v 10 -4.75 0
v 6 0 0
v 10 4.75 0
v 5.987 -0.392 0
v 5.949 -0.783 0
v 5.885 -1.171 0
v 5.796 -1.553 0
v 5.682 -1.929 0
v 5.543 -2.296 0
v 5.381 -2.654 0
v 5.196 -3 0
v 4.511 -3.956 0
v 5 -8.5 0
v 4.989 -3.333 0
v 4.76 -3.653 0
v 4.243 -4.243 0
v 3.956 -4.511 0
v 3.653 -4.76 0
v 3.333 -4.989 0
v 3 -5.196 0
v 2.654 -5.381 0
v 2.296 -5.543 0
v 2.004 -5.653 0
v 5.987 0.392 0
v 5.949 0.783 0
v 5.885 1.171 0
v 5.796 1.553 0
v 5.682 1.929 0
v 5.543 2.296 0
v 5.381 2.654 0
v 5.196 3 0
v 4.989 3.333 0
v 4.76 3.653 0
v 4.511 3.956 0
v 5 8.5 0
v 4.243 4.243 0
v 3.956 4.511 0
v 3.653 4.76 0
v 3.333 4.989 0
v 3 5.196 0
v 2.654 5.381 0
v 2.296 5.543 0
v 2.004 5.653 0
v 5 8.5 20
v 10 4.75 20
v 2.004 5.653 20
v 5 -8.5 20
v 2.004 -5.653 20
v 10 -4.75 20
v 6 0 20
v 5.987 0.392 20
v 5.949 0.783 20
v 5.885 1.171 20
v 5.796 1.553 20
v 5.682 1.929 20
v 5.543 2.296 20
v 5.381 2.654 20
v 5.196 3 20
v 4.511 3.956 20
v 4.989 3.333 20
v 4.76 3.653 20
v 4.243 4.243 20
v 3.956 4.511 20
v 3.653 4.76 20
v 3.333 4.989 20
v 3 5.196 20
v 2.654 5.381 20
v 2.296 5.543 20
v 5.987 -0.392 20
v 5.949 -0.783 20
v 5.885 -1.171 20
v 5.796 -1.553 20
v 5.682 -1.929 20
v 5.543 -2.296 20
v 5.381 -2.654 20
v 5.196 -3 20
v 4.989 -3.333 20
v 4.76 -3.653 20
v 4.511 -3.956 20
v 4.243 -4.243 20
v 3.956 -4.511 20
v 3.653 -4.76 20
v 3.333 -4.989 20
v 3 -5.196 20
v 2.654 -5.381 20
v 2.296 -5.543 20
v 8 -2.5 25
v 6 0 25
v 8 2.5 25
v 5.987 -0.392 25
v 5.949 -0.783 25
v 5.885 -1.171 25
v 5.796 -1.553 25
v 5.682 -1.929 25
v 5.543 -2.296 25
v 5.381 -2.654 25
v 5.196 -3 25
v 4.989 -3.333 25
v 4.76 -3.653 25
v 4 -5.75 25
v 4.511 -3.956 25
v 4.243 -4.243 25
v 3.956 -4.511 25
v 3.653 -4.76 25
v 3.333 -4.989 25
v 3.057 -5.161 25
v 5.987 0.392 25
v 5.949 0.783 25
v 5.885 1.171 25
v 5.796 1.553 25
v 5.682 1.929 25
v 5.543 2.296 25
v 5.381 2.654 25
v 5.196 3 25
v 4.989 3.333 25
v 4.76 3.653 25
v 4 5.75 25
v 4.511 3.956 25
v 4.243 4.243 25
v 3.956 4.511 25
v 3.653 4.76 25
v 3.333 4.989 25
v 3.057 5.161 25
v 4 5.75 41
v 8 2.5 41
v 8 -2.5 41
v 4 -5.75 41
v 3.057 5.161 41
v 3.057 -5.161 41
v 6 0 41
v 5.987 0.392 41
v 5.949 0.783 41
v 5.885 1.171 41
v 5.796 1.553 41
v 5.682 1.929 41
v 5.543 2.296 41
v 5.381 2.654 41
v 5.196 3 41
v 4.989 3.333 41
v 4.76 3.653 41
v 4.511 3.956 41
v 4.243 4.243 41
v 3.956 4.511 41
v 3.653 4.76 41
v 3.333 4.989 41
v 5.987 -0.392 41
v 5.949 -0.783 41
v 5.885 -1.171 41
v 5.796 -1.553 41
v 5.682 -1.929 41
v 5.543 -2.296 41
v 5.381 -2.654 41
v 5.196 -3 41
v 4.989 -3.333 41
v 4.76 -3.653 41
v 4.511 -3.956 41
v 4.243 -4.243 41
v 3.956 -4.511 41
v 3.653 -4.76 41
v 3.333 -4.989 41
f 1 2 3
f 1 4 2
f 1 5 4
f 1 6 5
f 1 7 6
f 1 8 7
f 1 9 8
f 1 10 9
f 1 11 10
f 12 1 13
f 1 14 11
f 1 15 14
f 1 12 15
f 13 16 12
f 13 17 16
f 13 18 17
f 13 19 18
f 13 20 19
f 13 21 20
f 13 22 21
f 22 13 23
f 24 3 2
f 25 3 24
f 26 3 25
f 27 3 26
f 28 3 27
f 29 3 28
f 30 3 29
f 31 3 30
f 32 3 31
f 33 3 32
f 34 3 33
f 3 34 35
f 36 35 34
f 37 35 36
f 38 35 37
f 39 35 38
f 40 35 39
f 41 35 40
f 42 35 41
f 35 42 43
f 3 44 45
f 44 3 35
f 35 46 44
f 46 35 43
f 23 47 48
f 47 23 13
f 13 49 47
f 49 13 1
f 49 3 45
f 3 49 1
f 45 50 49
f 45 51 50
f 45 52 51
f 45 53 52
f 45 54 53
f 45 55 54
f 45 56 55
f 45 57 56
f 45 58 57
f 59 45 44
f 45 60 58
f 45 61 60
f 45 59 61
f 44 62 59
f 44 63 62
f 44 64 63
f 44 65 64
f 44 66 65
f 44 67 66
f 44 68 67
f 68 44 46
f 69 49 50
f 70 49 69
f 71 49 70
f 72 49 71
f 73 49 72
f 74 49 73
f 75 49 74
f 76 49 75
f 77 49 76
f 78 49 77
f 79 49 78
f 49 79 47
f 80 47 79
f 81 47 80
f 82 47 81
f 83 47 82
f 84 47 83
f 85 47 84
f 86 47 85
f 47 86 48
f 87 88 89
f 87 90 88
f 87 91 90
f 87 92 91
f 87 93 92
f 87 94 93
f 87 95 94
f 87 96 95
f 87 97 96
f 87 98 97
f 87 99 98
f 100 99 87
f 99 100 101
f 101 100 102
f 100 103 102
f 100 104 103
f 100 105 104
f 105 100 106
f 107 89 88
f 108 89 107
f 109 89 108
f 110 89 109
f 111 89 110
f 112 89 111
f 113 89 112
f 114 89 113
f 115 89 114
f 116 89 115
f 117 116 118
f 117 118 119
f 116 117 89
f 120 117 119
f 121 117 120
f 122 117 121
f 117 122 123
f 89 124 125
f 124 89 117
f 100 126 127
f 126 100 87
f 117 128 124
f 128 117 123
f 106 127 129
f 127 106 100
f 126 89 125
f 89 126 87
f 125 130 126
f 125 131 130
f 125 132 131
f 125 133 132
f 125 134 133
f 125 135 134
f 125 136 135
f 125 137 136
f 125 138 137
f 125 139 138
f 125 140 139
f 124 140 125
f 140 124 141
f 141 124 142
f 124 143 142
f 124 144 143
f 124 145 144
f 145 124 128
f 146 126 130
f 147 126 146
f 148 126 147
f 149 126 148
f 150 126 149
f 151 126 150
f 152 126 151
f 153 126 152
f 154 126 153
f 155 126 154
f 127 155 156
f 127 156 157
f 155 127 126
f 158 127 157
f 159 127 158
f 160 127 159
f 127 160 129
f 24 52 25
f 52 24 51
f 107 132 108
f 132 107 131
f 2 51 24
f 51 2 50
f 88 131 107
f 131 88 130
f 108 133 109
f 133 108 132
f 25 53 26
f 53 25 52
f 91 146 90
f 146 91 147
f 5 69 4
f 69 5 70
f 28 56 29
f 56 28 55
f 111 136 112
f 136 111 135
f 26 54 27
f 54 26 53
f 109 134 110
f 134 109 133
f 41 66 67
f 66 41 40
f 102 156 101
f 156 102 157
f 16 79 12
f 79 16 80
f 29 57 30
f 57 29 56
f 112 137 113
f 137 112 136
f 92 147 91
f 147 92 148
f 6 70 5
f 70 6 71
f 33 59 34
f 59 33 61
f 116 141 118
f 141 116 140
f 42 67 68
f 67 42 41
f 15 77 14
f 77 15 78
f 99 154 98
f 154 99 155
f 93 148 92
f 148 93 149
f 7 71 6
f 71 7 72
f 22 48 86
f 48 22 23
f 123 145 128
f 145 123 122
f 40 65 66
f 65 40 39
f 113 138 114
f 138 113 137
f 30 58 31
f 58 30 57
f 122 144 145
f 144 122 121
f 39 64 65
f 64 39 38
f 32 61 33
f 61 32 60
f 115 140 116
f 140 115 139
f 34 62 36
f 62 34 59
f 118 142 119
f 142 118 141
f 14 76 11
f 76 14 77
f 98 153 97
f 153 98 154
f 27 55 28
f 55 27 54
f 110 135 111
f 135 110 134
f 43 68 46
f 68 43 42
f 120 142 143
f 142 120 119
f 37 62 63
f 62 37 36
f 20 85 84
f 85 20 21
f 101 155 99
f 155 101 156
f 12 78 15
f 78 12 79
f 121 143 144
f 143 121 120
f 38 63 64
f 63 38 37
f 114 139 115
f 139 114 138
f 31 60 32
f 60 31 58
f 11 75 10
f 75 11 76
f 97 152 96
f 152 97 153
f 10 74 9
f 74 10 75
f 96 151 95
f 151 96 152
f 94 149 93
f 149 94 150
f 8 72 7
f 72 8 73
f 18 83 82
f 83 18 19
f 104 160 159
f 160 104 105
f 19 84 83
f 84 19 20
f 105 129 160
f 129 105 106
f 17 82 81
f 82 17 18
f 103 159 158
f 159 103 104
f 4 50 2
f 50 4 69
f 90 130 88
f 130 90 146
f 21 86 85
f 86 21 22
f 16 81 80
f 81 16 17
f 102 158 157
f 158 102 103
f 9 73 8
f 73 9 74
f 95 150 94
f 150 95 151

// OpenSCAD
// Hose-barb reducer: joins 8 mm inner-diameter silicone tubing to 5 mm inner-diameter tubing
// Print orientation: standing upright along +Z, centred on origin in X/Y
// Units: mm

// ---------------- Parameters ----------------
reducer_d      = 12;   // central bore diameter (through full length)
z0             = 0;    // start of first (8 mm) barbs
z1             = 20;   // end of first barbs / start of collar
z2             = 25;   // end of collar / start of second (5 mm) barbs
z3             = 41;   // end of part

barb_h8        = 10;   // height of each 8 mm barb
barb_d8_bot    = 7.5;  // outer diameter of 8 mm barb at bottom
barb_d8_top    = 9.5;  // outer diameter of 8 mm barb at top
barb_n8        = 2;    // number of 8 mm barbs (stacked)

barb_h5        = 8;    // height of each 5 mm barb
barb_d5_bot    = 6.5;  // outer diameter of 5 mm barb at bottom
barb_d5_top    = 5.0;  // outer diameter of 5 mm barb at top
barb_n5        = 2;    // number of 5 mm barbs (stacked)

eps            = 0.5;  // overshoot for clean boolean cuts
$fn            = 96;   // curve resolution

// ---------------- Model ----------------
difference() {
    union() {
        // 8 mm tubing barbs: sawtooth profile, stacked
        for (i = [0 : barb_n8 - 1]) {
            translate([0, 0, z0 + i * barb_h8])
                linear_extrude(height = barb_h8)
                    polygon([
                        [0, -barb_d8_bot / 2],
                        [0,  barb_d8_bot / 2],
                        [barb_h8 / 2, (barb_d8_bot + barb_d8_top) / 2],
                        [barb_h8,   barb_d8_top / 2],
                        [barb_h8,  -barb_d8_top / 2],
                        [barb_h8 / 2, -(barb_d8_bot + barb_d8_top) / 2]
                    ]);
        }

        // Cylindrical collar
        translate([0, 0, z1])
            cylinder(d = reducer_d, h = z2 - z1);

        // 5 mm tubing barbs: shrinking profile, stacked
        for (i = [0 : barb_n5 - 1]) {
            translate([0, 0, z2 + i * barb_h5])
                linear_extrude(height = barb_h5)
                    polygon([
                        [0, -barb_d5_bot / 2],
                        [0,  barb_d5_bot / 2],
                        [barb_h5 / 2, (barb_d5_bot + barb_d5_top) / 2],
                        [barb_h5,   barb_d5_top / 2],
                        [barb_h5,  -barb_d5_top / 2],
                        [barb_h5 / 2, -(barb_d5_bot + barb_d5_top) / 2]
                    ]);
        }
    }

    // Central bore through full length
    translate([0, 0, -eps])
        cylinder(d = reducer_d, h = z3 - z0 + 2 * eps);
}
